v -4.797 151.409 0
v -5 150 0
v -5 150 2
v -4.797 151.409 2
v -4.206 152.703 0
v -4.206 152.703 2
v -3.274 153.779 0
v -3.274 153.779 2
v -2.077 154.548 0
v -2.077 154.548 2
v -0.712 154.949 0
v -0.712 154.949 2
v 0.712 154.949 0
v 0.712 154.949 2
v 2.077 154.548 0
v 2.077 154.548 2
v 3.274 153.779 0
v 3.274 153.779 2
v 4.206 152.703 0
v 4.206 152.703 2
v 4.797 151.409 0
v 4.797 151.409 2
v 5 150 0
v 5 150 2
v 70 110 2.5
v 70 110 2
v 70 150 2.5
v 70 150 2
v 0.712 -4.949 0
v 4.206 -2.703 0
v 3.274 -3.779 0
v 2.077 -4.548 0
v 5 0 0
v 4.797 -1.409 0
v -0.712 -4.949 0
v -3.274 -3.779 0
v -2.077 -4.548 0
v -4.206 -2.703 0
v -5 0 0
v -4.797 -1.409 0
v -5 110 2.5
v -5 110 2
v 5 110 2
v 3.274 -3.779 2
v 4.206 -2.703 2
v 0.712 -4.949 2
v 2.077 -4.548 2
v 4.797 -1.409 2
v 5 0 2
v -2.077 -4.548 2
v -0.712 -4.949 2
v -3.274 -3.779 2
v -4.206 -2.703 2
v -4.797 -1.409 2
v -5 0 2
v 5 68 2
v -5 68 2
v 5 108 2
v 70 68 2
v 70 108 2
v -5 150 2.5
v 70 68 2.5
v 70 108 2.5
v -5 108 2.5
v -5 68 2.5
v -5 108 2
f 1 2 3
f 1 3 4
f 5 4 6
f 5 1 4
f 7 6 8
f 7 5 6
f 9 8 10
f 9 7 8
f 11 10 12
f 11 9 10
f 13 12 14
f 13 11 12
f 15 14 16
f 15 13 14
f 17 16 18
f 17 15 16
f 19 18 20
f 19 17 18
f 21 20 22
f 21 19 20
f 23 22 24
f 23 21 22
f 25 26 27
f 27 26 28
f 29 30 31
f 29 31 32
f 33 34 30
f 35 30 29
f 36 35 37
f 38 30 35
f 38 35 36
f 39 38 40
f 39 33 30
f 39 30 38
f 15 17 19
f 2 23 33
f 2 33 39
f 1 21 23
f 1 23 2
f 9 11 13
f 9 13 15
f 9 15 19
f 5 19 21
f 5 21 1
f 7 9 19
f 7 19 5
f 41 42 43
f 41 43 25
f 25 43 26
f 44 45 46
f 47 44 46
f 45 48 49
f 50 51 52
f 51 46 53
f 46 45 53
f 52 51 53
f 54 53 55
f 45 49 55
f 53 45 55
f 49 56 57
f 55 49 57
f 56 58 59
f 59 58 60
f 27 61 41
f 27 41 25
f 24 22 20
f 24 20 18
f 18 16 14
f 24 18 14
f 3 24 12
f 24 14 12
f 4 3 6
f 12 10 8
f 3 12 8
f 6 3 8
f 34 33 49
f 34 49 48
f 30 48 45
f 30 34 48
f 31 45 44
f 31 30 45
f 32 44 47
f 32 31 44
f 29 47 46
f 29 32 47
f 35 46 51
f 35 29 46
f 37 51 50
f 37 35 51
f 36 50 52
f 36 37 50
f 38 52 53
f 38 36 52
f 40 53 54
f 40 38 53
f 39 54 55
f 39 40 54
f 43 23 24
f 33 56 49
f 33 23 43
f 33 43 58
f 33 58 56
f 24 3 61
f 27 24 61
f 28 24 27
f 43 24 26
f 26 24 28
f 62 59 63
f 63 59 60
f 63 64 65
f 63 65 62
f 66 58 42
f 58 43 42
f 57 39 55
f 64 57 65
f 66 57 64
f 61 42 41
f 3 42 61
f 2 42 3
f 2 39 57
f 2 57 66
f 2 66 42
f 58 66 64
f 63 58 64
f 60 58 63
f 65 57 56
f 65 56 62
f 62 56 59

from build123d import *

# Parameters (mm, degrees)
BOSS_EXTRU_1_DEPTH = 2
ESQUISSE2_W        = 75
ESQUISSE2_H        = 40
BOSS_EXTRU_2_DEPTH = 0.5


with BuildPart() as part:
    # Esquisse1 → Boss.-Extru.1 (new body)
    with BuildSketch(Plane.XY):
        with BuildLine():
            Line((-5, 0), (-5, 150))
            ThreePointArc((-5, 150), (0, 155), (5, 150))
            Line((5, 150), (5, 0))
            ThreePointArc((5, 0), (0, -5), (-5, 0))
        make_face()
    extrude(amount=BOSS_EXTRU_1_DEPTH)

    # Esquisse2 → Boss.-Extru.2 (add)
    with BuildSketch(Plane.XY.offset(2)):
        with Locations((32.5, 130)):
            Rectangle(ESQUISSE2_W, ESQUISSE2_H)
        with Locations((32.5, 88)):
            Rectangle(ESQUISSE2_W, ESQUISSE2_H)
    extrude(amount=BOSS_EXTRU_2_DEPTH)


solid = part.part
